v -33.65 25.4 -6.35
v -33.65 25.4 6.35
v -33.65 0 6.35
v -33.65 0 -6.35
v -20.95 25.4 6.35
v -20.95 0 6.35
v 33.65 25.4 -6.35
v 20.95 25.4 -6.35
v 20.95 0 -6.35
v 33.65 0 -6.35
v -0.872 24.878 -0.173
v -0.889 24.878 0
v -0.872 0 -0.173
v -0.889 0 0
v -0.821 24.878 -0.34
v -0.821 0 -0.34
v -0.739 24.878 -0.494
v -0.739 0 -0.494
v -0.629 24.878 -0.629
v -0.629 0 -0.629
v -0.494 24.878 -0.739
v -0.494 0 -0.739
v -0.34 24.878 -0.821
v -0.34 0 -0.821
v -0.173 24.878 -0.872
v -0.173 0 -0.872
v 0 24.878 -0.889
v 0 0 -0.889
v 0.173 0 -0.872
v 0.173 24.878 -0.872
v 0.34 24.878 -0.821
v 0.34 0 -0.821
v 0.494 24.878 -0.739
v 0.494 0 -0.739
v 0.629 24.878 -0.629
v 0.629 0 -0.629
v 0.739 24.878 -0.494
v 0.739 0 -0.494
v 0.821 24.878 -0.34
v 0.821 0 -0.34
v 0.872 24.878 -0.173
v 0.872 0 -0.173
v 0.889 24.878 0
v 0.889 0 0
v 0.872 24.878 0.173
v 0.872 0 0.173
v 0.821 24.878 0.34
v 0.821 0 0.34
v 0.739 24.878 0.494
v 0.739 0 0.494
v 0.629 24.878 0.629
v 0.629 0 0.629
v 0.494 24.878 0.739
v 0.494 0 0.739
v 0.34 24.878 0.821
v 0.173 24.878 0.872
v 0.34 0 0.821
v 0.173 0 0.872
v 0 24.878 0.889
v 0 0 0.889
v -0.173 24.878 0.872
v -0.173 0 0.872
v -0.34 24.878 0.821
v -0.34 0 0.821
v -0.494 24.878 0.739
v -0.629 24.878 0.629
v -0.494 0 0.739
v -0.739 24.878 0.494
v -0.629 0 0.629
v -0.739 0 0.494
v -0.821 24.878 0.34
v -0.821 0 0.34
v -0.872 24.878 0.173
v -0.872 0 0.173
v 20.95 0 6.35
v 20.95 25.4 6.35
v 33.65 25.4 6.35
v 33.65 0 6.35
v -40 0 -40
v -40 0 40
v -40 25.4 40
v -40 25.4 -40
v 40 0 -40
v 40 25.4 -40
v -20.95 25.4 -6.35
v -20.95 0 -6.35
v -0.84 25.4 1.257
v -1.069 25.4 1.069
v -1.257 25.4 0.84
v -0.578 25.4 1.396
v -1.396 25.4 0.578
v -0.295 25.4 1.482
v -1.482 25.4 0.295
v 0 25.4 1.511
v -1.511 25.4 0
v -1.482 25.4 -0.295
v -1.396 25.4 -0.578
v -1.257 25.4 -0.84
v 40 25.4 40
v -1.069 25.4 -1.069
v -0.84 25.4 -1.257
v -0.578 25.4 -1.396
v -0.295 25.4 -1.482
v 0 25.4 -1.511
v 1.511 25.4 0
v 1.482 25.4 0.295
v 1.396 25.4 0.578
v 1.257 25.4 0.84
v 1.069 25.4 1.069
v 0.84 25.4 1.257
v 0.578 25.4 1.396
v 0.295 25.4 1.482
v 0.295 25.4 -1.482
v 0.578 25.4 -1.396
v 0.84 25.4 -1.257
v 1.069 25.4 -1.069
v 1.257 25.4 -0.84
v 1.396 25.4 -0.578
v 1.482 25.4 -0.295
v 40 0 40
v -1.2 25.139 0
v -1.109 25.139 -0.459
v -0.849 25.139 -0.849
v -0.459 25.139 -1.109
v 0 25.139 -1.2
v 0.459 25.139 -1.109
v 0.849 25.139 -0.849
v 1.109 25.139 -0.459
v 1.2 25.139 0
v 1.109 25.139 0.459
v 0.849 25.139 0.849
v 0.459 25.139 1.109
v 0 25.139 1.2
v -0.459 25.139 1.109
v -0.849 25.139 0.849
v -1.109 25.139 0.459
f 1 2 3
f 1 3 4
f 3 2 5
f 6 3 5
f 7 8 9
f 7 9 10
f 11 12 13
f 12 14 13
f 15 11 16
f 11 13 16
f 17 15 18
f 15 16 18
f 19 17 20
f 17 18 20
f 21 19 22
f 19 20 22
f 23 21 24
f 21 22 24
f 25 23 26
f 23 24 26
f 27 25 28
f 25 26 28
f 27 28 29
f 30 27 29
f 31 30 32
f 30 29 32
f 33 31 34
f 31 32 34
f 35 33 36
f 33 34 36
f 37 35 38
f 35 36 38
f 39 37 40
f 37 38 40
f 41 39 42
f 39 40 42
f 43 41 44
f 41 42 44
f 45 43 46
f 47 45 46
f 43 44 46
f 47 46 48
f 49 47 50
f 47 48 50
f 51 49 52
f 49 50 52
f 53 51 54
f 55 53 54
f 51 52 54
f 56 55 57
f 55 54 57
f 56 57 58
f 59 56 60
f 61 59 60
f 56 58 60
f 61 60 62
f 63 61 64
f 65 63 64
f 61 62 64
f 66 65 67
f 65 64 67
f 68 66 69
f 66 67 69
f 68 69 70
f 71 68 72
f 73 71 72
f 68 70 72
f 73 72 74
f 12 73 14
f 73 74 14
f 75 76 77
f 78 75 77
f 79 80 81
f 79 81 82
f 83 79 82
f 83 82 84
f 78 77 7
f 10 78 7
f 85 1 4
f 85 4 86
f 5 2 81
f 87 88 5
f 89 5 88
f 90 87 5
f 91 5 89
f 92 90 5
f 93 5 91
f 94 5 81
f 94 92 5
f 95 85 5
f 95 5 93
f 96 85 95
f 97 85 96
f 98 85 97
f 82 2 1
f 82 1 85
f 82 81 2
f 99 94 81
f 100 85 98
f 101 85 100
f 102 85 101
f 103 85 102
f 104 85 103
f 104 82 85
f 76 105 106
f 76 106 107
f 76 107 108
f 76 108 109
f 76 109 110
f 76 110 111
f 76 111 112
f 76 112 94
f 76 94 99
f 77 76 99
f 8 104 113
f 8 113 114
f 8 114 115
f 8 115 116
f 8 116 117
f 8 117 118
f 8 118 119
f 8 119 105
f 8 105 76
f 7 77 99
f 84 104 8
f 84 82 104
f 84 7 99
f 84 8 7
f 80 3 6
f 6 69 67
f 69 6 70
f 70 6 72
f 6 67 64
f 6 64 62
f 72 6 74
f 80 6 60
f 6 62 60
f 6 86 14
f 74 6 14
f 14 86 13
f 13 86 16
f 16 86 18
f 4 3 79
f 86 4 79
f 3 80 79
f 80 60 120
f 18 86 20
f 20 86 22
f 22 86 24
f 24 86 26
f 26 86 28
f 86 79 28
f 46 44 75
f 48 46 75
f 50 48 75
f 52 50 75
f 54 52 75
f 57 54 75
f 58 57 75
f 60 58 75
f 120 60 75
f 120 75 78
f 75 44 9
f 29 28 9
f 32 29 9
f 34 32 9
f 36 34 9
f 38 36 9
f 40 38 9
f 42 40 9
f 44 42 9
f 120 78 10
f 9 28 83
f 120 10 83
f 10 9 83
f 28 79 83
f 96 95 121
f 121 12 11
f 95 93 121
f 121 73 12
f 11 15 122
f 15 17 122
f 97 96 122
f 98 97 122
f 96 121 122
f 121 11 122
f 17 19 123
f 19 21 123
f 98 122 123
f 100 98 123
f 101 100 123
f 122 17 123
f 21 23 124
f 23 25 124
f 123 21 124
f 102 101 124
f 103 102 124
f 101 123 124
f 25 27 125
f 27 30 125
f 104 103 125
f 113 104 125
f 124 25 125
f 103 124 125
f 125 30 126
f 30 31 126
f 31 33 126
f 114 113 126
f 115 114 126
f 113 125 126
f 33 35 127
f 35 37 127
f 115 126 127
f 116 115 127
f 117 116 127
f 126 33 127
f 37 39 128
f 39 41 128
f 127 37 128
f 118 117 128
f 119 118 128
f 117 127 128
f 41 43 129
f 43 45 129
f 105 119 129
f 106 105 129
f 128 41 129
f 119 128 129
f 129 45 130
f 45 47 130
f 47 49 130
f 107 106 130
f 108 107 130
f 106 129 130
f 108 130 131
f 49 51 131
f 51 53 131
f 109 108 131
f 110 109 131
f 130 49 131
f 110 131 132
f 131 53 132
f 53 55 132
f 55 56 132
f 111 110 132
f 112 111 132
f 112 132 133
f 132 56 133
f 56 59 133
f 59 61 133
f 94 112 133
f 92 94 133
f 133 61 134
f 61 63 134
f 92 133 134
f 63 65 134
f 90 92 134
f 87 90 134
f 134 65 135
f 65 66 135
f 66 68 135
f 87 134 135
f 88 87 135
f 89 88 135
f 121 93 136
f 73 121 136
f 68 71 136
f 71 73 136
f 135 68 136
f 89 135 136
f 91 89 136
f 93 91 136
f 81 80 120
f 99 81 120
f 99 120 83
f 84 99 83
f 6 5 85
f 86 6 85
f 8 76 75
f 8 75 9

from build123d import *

# Parameters (mm, degrees)
SKETCH1_W                                         = 80
SKETCH1_H                                         = 80
SKETCH1_W_2                                       = 12.7
SKETCH1_H_2                                       = 12.7
BOSS_EXTRUDE1_DEPTH                               = 25.4
CSK_FOR_0_FLAT_HEAD_MACHINE_SCREW_100_D           = 1.778
CSK_FOR_0_FLAT_HEAD_MACHINE_SCREW_100_CSINK_D     = 3.0226
CSK_FOR_0_FLAT_HEAD_MACHINE_SCREW_100_CSINK_ANGLE = 100


with BuildPart() as part:
    # Sketch1 → Boss-Extrude1 (new body)
    with BuildSketch(Plane(origin=(0, 0, 0), x_dir=(1, 0, 0), z_dir=(0, 1, 0))):
        Rectangle(SKETCH1_W, SKETCH1_H)
        with Locations((-27.3, 0)):
            Rectangle(SKETCH1_W_2, SKETCH1_H_2, mode=Mode.SUBTRACT)
        with Locations((27.3, 0)):
            Rectangle(SKETCH1_W_2, SKETCH1_H_2, mode=Mode.SUBTRACT)
    extrude(amount=BOSS_EXTRUDE1_DEPTH)

    # CSK for #0 Flat Head Machine Screw (100)1 (through all)
    with Locations(Plane(origin=(0, 25.4, 0), x_dir=(1, 0, 0), z_dir=(0, 1, 0))):
        with Locations((0, 0)):
            CounterSinkHole(CSK_FOR_0_FLAT_HEAD_MACHINE_SCREW_100_D / 2, CSK_FOR_0_FLAT_HEAD_MACHINE_SCREW_100_CSINK_D / 2, counter_sink_angle=CSK_FOR_0_FLAT_HEAD_MACHINE_SCREW_100_CSINK_ANGLE)


solid = part.part
